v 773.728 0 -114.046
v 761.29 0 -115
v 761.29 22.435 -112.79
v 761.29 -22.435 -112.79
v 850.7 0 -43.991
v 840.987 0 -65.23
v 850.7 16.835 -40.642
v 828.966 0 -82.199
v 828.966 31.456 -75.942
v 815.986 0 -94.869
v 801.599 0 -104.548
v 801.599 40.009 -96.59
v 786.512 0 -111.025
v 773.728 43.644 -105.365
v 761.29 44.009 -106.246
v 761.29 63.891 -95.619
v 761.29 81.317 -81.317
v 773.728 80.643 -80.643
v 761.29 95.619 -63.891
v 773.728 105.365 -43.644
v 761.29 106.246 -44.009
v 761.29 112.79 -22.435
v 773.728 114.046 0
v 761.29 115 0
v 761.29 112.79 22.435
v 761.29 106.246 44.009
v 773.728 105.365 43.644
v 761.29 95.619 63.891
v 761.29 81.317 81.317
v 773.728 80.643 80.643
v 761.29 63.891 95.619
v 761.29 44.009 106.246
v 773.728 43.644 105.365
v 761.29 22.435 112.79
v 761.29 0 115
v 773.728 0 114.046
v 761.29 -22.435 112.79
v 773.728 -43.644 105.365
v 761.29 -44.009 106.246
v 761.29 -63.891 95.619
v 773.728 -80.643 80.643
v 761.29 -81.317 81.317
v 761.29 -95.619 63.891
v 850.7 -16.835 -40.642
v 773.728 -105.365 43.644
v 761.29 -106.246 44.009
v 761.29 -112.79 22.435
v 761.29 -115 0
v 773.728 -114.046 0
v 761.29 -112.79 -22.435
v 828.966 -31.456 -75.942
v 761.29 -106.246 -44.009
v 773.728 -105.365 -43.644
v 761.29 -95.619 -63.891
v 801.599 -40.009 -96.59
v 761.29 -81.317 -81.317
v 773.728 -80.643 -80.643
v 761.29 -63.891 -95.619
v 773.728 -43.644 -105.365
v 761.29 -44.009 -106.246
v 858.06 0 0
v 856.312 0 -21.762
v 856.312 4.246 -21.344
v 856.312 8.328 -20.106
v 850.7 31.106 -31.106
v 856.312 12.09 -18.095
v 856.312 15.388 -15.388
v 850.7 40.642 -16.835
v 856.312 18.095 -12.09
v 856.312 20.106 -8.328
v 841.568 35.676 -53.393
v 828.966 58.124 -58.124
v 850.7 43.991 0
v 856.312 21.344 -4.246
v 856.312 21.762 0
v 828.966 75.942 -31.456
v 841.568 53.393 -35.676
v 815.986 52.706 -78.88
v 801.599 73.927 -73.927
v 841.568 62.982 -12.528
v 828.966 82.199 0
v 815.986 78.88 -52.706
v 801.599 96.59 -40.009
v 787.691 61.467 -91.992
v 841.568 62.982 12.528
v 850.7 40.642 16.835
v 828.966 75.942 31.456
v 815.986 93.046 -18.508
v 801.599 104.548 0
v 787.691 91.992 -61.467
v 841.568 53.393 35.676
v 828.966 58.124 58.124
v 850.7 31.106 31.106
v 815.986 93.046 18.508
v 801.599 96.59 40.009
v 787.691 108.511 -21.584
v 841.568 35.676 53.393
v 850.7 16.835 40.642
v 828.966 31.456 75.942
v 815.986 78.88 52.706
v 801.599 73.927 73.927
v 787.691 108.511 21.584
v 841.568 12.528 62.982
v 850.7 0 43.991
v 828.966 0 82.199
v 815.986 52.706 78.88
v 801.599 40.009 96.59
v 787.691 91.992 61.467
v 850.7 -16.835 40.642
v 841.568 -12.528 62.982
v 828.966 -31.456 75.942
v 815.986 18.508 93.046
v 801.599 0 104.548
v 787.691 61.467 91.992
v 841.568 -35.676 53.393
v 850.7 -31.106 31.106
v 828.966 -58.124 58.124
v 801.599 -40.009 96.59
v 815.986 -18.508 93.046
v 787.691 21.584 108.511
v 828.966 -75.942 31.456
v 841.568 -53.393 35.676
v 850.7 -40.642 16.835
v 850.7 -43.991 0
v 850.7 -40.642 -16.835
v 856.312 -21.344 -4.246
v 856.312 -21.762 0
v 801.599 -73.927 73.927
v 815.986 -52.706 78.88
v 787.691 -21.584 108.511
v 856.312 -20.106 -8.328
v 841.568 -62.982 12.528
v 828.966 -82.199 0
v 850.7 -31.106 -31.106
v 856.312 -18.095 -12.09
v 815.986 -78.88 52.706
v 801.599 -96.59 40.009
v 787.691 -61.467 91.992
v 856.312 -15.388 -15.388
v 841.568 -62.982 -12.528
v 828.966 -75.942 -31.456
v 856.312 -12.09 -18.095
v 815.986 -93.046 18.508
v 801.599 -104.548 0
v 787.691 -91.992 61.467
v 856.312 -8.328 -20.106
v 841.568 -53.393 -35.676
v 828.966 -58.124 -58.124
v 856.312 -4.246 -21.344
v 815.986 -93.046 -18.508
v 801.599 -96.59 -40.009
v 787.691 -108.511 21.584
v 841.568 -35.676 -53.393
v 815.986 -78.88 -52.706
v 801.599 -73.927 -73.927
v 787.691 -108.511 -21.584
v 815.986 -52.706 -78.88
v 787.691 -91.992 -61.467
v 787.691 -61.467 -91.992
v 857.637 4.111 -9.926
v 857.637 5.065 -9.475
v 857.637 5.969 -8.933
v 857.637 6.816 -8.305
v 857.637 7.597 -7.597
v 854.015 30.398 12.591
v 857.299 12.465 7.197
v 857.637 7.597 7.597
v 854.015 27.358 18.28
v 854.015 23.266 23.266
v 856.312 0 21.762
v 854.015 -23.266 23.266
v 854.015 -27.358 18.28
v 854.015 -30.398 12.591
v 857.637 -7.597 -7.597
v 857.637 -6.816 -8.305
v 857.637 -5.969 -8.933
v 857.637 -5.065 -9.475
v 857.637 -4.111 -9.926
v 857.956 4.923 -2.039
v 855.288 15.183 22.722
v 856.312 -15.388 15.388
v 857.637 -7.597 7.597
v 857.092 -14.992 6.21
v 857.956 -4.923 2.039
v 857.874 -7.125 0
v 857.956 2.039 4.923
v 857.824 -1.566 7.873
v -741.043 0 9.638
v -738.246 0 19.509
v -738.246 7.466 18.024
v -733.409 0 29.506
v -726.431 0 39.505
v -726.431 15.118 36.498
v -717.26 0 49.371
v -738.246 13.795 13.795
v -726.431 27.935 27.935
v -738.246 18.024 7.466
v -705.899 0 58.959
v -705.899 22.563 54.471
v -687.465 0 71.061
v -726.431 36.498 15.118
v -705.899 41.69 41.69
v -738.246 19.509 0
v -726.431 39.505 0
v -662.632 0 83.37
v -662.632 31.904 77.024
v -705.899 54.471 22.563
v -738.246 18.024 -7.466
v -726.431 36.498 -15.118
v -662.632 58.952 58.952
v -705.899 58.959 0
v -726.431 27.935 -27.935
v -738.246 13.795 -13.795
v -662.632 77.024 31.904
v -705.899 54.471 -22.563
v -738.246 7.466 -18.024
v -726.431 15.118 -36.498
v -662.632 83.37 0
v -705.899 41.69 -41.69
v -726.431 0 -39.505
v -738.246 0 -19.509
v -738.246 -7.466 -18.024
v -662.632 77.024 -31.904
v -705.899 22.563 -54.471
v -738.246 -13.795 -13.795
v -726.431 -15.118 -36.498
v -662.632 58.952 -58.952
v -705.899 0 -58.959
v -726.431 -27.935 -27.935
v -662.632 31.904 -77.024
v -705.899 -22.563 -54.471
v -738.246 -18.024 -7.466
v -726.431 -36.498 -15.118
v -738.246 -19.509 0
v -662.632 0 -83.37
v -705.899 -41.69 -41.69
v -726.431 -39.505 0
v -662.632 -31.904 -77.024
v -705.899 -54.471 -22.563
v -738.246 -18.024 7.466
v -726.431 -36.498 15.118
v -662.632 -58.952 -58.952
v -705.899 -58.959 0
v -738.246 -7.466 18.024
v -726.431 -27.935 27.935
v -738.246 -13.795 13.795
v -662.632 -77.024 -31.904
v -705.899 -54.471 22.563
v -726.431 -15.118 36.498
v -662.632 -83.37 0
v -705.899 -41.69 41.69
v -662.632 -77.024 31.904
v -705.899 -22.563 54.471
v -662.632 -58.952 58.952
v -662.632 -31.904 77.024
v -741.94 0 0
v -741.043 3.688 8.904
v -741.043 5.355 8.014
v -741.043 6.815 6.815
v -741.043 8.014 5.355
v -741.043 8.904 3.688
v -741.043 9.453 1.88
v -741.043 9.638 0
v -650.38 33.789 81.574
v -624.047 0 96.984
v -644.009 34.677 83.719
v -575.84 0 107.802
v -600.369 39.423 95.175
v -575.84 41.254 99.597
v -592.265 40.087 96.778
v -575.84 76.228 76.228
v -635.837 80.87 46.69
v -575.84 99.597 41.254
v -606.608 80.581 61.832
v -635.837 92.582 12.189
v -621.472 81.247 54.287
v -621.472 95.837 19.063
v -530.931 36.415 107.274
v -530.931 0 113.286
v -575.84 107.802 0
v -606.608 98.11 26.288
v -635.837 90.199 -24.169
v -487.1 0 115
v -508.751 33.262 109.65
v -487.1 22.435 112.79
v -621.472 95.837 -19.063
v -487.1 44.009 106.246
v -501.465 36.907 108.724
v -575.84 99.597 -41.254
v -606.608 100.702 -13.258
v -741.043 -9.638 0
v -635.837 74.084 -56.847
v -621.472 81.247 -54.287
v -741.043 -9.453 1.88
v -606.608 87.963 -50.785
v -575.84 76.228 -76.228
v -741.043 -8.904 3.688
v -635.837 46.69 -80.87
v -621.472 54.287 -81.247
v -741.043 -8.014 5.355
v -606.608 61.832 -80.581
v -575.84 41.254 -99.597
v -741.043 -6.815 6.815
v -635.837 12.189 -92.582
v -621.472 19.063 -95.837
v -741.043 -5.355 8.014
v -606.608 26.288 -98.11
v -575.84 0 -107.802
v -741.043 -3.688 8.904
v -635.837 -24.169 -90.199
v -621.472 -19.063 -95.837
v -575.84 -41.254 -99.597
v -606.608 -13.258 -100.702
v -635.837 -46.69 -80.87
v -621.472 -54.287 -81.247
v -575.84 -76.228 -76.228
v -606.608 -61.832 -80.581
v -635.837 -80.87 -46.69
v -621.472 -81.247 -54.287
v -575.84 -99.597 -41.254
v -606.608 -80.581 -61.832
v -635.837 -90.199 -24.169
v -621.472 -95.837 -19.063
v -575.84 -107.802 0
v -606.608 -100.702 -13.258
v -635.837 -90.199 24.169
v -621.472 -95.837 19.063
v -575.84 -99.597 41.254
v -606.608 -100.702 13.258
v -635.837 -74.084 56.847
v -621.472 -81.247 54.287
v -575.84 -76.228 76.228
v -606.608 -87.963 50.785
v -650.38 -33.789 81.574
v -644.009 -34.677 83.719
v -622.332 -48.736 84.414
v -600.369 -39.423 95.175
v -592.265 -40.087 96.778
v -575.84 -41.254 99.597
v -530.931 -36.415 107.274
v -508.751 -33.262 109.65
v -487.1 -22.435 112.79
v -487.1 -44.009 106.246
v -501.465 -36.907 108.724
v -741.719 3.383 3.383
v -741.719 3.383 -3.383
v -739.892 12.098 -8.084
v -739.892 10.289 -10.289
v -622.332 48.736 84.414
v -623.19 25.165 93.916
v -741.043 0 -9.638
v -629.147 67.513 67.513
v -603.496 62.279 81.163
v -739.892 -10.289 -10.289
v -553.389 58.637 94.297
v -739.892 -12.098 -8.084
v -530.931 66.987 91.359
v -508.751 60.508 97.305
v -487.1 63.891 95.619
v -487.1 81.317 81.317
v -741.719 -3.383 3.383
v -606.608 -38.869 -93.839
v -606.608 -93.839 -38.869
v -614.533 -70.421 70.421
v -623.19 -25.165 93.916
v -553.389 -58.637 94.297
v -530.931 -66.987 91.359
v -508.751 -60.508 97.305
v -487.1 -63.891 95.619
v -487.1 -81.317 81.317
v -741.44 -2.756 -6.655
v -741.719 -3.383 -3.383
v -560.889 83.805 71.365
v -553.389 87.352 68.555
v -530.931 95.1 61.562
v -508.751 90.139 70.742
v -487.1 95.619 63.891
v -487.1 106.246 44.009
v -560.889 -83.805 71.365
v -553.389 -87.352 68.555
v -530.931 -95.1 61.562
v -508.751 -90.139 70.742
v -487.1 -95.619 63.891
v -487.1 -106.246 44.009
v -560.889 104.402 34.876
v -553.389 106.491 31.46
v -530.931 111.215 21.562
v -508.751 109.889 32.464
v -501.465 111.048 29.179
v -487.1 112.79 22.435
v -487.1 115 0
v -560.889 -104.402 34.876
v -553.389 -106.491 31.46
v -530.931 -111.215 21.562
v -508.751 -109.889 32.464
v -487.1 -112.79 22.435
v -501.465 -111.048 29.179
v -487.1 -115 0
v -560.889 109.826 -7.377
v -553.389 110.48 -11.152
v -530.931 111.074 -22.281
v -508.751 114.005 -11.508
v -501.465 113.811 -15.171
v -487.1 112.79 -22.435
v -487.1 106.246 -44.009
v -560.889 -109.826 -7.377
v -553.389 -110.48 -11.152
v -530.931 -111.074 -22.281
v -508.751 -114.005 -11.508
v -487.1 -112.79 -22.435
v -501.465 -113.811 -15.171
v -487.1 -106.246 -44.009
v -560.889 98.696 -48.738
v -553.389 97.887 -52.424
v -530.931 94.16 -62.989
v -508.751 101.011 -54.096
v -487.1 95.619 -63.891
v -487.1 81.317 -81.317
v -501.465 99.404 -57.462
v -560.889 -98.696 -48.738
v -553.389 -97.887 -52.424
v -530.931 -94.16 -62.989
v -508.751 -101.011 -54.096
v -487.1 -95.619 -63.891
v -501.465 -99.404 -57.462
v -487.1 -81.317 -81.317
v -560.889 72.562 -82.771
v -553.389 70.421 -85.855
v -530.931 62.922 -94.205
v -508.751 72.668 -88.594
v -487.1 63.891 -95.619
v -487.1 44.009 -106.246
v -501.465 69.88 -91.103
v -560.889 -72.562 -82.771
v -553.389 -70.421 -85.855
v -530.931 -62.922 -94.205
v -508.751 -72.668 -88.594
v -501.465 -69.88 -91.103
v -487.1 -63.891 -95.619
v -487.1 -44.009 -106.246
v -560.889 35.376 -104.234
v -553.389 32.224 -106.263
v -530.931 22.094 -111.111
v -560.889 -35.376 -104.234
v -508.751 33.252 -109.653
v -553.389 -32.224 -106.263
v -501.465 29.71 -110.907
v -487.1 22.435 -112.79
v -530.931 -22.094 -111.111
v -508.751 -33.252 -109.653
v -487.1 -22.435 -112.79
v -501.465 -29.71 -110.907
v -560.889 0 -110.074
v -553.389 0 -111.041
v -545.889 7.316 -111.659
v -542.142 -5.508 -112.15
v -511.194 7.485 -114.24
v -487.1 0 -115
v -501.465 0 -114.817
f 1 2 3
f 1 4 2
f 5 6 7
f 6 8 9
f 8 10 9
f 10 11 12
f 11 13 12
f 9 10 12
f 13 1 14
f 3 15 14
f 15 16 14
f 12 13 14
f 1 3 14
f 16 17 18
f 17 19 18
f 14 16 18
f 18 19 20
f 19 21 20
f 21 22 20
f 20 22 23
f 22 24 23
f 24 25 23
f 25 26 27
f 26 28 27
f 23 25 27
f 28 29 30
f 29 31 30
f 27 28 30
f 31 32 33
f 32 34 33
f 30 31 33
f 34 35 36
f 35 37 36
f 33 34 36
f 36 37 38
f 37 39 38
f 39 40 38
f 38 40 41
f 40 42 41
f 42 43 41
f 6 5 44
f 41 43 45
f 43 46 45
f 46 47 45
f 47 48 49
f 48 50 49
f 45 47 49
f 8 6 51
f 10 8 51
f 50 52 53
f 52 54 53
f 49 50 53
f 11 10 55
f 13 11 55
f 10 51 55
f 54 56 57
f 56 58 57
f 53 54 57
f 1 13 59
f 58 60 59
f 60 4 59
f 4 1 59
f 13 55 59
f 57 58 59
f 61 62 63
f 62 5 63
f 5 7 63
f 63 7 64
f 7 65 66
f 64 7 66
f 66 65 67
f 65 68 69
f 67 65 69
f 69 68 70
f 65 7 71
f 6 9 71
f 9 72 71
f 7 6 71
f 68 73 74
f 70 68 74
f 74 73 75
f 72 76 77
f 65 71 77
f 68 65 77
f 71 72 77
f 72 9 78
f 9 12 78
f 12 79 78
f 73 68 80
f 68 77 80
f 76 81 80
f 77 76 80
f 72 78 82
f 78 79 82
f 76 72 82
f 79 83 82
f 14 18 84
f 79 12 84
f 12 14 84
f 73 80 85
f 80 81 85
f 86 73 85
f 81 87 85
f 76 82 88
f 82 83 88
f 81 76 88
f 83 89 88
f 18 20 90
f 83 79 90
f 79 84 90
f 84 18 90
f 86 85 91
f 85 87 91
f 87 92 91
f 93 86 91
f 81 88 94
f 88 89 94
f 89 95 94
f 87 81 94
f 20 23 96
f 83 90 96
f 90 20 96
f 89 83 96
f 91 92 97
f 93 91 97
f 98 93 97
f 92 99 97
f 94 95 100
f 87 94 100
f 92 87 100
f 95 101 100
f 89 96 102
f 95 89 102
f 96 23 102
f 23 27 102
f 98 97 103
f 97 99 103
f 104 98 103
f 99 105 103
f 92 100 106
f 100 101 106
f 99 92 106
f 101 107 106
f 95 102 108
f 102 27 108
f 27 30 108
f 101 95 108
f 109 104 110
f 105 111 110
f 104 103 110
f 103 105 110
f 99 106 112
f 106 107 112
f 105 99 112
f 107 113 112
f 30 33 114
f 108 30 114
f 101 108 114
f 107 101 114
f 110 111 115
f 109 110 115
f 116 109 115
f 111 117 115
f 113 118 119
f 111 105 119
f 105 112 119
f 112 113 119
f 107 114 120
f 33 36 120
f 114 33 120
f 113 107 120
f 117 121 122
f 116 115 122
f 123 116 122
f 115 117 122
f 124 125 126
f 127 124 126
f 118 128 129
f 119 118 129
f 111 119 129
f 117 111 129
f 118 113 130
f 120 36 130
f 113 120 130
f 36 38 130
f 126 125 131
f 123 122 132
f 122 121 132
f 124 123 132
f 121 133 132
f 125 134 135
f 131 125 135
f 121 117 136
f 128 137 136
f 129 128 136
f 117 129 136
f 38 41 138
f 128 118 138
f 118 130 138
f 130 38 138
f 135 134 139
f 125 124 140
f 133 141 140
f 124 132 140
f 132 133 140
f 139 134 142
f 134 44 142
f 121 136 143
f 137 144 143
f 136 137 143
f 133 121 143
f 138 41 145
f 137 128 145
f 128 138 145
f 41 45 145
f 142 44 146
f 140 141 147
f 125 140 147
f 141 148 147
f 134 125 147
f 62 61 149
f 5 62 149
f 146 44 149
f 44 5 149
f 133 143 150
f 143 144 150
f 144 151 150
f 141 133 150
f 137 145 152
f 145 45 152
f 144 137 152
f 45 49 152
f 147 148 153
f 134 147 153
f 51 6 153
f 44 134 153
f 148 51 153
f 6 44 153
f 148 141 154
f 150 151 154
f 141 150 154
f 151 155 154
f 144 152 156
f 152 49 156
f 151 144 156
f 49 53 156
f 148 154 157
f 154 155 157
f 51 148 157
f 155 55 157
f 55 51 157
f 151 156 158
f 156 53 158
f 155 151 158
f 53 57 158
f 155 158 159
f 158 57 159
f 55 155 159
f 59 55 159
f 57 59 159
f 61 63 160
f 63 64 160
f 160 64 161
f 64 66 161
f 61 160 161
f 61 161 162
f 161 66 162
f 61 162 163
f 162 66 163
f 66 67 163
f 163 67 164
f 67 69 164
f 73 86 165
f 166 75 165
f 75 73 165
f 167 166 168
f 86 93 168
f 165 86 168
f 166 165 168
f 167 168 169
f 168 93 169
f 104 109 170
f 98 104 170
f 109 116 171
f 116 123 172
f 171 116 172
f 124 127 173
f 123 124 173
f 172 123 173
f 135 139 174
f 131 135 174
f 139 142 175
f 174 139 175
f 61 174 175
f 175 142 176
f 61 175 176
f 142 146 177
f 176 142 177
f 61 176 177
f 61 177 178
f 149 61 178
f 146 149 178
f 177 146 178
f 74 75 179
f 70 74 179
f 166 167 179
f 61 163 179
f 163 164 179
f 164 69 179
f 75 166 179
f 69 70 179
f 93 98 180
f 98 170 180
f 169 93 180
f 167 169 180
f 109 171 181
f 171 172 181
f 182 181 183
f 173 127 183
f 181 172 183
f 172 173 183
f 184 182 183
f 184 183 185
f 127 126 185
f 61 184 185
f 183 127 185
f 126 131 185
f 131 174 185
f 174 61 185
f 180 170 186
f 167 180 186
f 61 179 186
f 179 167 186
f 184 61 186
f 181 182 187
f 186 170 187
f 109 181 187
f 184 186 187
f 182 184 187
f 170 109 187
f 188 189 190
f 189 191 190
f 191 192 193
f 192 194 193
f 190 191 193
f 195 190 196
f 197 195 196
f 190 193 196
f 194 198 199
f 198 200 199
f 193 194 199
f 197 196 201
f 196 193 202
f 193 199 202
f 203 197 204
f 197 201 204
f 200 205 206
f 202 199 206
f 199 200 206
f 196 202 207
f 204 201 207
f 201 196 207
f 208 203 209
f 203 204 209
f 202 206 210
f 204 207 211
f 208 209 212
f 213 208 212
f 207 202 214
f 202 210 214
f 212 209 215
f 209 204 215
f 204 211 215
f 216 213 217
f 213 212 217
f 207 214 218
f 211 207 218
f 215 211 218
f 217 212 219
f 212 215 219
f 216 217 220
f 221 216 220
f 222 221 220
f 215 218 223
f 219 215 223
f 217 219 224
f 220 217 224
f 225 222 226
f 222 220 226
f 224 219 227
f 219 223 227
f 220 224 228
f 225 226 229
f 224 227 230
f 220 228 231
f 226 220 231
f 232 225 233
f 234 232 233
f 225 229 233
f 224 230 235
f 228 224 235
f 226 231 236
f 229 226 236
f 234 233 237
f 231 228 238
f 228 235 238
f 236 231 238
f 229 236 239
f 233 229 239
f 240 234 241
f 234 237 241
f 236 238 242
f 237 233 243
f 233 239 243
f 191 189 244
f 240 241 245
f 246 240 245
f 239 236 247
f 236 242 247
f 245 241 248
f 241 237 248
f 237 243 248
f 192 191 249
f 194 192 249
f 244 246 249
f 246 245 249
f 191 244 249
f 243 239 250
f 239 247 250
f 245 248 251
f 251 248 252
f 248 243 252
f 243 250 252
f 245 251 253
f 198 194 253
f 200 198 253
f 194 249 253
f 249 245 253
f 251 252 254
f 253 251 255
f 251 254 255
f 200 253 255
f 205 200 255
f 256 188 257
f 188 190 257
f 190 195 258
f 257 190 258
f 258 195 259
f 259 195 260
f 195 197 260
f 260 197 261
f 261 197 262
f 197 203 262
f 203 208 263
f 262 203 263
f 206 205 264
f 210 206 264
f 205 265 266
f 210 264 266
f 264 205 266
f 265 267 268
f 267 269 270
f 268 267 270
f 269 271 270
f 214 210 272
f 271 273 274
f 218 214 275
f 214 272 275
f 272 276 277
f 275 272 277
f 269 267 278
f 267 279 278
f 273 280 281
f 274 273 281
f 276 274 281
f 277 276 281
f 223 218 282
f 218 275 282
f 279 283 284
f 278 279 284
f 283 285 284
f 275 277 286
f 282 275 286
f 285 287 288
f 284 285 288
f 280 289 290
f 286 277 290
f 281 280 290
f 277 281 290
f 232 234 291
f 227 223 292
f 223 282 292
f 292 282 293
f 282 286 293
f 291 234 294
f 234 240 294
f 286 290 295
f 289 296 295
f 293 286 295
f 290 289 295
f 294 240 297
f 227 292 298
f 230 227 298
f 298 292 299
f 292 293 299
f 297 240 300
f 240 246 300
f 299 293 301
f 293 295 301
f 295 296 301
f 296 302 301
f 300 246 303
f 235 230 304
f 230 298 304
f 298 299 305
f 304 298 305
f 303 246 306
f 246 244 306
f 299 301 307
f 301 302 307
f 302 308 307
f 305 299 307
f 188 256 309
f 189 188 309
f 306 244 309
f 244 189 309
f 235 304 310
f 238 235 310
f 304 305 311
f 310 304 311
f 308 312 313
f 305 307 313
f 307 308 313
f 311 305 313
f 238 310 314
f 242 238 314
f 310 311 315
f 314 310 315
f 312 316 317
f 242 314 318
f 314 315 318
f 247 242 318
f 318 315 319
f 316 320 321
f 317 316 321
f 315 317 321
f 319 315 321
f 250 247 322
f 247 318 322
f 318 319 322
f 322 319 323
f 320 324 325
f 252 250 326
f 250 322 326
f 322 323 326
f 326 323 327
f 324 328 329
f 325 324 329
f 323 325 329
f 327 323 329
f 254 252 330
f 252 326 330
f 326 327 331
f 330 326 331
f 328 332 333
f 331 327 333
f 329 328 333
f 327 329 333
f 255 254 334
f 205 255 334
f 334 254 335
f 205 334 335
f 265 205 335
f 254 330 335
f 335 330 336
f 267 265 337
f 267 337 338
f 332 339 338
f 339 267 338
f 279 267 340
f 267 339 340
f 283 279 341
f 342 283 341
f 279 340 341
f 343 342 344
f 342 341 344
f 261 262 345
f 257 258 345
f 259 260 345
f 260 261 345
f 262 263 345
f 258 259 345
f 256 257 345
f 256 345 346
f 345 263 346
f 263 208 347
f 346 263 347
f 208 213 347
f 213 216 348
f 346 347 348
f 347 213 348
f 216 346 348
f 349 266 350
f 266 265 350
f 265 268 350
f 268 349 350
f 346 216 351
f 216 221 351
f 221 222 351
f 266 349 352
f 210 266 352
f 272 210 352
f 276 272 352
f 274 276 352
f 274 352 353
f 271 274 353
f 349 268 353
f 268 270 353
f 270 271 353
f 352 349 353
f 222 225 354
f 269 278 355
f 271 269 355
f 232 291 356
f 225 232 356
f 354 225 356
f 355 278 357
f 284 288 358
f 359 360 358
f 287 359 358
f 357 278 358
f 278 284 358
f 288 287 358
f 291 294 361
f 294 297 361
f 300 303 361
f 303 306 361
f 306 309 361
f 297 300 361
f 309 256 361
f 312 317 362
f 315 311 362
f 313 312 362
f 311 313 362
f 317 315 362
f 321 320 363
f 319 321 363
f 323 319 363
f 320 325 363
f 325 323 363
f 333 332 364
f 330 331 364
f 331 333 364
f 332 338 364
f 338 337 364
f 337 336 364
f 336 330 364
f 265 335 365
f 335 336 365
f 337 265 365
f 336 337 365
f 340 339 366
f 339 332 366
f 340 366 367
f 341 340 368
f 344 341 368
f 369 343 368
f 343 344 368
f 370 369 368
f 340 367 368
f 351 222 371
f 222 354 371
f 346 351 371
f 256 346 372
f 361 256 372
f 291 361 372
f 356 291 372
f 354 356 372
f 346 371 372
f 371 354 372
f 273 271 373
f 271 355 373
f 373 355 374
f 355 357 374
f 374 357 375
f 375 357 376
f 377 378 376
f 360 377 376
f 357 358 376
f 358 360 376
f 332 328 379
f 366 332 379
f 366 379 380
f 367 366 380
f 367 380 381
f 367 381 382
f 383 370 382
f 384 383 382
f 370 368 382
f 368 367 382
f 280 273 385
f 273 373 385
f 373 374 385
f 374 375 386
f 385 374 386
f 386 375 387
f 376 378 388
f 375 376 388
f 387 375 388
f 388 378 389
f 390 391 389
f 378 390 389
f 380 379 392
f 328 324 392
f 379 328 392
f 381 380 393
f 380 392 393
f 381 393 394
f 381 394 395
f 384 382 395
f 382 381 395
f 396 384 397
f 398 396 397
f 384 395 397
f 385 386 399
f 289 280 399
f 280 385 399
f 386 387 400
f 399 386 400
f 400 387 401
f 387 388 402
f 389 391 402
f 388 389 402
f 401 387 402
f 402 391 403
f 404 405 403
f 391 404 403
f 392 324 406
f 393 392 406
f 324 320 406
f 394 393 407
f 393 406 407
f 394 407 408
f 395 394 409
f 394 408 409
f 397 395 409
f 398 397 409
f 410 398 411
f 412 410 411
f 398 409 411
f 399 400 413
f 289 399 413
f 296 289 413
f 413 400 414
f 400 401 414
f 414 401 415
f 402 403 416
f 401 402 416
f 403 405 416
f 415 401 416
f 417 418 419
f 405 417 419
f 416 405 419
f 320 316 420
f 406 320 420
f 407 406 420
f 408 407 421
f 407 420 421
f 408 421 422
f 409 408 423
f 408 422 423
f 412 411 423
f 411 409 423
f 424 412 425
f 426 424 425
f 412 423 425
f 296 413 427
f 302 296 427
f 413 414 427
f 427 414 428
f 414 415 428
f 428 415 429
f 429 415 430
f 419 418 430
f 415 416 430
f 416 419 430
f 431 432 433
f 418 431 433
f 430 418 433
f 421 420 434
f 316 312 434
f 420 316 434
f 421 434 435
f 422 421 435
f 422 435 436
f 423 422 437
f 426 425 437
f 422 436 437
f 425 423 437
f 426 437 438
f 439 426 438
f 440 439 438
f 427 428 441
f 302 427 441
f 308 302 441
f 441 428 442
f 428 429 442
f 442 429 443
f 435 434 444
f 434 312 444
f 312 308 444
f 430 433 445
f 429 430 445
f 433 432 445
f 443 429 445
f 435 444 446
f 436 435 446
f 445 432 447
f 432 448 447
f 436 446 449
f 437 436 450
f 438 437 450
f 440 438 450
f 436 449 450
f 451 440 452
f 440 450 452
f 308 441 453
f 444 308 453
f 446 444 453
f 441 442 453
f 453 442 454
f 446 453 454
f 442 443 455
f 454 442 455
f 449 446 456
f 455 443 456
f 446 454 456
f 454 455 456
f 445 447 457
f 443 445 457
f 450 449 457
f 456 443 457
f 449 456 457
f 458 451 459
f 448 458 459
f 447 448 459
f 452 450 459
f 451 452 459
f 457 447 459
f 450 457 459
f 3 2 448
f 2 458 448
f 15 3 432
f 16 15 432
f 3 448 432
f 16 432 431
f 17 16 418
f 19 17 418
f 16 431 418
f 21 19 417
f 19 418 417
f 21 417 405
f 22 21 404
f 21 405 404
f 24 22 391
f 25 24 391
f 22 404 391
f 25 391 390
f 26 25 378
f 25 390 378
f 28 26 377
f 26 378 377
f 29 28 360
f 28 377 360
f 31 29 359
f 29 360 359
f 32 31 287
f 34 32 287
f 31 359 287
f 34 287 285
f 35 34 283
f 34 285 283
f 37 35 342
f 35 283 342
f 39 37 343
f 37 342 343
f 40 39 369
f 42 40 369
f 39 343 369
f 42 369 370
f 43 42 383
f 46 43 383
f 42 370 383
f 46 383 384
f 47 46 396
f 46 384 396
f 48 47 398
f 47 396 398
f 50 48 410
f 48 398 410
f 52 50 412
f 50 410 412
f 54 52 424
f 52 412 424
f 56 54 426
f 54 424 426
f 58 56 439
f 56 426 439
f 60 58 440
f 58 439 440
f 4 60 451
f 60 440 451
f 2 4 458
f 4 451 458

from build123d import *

# Parameters (mm, degrees)
SKETCH1_R           = 115
BOSS_EXTRUDE2_DEPTH = 761.29
BOSS_EXTRUDE3_START = -487.1
SKETCH2_R           = 115
BOSS_EXTRUDE3_DEPTH = 487.1


with BuildPart() as part:
    # Sketch1 → Boss-Extrude2 (new body)
    with BuildSketch(Plane(origin=(0, 0, 0), x_dir=(0, 0, -1), z_dir=(1, 0, 0))):
        Circle(SKETCH1_R)
    extrude(amount=BOSS_EXTRUDE2_DEPTH)

    # Sketch2 → Boss-Extrude3 (add)
    with BuildSketch(Plane(origin=(0, 0, 0), x_dir=(0, 0, -1), z_dir=(1, 0, 0)).offset(BOSS_EXTRUDE3_START)):
        Circle(SKETCH2_R)
    extrude(amount=BOSS_EXTRUDE3_DEPTH)

    # Sketch3 → Revolve1 (revolve)
    with BuildSketch(Plane(origin=(0, 0, 0), x_dir=(1, 0, 0), z_dir=(0, 1, 0))):
        with BuildLine():
            Line((761.29, 0), (858.06, 0))
            add(Edge.make_bspline(
                [(858.06, 0), (858.06, 115), (761.29, 115)],
                knots=[4.71238898, 4.71238898, 4.71238898, 6.283185307, 6.283185307, 6.283185307], degree=2, weights=[1, 0.707106781, 1]))
            Line((761.29, 115), (761.29, 0))
        make_face()
    revolve(axis=Axis((761.29, 0, 0), (1, 0, 0)))

    # Sketch4 → Revolve2 (revolve)
    with BuildSketch(Plane(origin=(0, 0, 0), x_dir=(1, 0, 0), z_dir=(0, 1, 0))):
        with BuildLine():
            Line((-487.1, 0), (-741.94, 0))
            add(Edge.make_bspline(
                [(-741.94, 0), (-741.94, -115), (-487.1, -115)],
                knots=[0, 0, 0, 1.570796327, 1.570796327, 1.570796327], degree=2, weights=[1, 0.707106781, 1]))
            Line((-487.1, -115), (-487.1, 0))
        make_face()
    revolve(axis=Axis((858.06, 0, 0), (-1, 0, 0)))


solid = part.part
